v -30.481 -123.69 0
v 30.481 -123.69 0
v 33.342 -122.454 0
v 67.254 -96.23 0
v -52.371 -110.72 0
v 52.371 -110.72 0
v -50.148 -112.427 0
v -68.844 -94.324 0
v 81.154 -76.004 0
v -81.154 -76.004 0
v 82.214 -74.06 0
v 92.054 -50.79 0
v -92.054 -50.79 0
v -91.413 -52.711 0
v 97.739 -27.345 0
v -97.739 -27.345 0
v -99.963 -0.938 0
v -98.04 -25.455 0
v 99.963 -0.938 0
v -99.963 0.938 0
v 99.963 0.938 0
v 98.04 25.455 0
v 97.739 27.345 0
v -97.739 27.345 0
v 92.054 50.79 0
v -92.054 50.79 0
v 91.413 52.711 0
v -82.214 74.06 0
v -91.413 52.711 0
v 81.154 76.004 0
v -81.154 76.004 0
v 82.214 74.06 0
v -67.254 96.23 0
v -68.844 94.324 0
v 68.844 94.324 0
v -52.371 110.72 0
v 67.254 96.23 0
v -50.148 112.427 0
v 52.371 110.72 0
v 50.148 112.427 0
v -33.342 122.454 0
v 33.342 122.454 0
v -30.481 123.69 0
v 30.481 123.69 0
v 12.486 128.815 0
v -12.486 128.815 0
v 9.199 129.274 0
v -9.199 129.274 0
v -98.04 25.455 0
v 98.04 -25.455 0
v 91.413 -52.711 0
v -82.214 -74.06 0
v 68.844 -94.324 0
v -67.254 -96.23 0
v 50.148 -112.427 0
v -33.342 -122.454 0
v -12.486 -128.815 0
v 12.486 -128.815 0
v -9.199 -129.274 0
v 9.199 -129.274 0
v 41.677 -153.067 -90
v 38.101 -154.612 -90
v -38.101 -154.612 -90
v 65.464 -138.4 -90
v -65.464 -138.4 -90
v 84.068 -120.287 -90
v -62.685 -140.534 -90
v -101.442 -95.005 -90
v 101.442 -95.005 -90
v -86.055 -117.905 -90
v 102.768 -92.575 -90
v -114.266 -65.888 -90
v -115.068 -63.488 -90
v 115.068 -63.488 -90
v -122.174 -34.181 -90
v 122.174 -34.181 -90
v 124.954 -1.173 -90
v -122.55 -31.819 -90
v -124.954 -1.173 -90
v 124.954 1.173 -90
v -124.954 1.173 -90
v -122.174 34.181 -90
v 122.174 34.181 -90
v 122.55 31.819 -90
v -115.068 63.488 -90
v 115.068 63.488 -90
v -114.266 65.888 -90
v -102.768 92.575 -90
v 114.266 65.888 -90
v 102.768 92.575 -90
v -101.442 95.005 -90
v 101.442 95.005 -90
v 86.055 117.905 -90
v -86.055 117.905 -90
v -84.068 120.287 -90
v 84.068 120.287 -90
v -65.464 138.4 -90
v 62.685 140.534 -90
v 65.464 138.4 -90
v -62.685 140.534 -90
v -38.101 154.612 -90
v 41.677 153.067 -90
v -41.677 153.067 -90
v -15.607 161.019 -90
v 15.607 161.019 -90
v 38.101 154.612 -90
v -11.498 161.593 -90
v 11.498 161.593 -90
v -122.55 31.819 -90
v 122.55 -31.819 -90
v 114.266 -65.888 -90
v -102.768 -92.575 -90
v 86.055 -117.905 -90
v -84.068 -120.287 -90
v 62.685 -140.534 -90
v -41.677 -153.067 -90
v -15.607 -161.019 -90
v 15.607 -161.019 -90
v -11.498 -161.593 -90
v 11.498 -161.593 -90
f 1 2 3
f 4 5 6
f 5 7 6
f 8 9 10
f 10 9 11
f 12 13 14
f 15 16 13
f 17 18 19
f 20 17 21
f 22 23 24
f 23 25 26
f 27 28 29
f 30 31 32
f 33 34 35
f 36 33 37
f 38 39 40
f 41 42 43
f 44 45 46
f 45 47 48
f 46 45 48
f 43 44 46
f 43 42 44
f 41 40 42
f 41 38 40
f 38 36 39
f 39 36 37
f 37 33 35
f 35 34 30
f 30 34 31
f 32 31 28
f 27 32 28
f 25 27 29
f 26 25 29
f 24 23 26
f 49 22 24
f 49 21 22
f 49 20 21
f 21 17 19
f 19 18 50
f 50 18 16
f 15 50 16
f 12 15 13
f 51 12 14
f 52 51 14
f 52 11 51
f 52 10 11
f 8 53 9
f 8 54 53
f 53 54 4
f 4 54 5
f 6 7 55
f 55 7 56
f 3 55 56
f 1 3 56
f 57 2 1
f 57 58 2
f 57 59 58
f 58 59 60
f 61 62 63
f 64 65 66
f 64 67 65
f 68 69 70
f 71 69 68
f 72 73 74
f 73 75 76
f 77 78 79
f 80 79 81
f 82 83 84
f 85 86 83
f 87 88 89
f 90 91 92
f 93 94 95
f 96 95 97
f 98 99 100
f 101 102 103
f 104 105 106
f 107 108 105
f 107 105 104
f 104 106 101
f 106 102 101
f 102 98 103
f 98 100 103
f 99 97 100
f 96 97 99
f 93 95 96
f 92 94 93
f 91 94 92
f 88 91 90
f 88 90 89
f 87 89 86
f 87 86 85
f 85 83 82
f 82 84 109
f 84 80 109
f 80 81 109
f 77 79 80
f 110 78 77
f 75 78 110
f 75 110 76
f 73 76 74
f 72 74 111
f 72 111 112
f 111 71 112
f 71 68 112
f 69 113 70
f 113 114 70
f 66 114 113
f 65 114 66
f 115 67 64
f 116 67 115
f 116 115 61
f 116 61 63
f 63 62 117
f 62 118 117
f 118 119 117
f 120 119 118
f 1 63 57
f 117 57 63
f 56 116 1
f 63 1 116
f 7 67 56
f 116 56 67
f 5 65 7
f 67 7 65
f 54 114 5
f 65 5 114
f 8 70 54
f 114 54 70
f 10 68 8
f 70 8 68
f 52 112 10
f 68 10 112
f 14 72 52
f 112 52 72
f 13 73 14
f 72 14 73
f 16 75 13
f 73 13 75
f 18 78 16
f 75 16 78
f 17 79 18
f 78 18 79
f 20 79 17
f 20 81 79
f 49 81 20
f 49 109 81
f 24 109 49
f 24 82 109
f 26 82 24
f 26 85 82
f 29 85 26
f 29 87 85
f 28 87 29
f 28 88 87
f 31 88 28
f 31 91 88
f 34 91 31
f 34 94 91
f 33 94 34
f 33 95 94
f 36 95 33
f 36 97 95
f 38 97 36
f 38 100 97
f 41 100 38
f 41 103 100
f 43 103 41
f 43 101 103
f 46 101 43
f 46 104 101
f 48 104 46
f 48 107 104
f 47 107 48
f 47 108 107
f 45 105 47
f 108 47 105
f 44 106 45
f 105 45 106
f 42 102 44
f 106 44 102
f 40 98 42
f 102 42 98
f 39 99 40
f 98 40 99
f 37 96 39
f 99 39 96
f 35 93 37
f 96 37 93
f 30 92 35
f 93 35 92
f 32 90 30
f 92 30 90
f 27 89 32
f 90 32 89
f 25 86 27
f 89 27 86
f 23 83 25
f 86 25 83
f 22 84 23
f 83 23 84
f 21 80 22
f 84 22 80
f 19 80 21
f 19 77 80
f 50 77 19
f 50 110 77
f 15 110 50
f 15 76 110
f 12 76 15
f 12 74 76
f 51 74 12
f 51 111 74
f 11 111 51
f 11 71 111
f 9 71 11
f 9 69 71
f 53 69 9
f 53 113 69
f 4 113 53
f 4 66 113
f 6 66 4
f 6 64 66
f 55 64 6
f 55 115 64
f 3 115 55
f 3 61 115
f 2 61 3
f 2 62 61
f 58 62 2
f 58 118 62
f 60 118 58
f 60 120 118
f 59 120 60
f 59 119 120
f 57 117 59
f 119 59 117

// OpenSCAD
rotate([0, 180, 0]) {
    linear_extrude(90, scale=1.25) {
        difference()
        offset(12)
        scale([1.0,1.34]) 
        circle(r=88.0); 
                scale([1.0,1.34]) 
        circle(r=88.0); 
        
    }
}
